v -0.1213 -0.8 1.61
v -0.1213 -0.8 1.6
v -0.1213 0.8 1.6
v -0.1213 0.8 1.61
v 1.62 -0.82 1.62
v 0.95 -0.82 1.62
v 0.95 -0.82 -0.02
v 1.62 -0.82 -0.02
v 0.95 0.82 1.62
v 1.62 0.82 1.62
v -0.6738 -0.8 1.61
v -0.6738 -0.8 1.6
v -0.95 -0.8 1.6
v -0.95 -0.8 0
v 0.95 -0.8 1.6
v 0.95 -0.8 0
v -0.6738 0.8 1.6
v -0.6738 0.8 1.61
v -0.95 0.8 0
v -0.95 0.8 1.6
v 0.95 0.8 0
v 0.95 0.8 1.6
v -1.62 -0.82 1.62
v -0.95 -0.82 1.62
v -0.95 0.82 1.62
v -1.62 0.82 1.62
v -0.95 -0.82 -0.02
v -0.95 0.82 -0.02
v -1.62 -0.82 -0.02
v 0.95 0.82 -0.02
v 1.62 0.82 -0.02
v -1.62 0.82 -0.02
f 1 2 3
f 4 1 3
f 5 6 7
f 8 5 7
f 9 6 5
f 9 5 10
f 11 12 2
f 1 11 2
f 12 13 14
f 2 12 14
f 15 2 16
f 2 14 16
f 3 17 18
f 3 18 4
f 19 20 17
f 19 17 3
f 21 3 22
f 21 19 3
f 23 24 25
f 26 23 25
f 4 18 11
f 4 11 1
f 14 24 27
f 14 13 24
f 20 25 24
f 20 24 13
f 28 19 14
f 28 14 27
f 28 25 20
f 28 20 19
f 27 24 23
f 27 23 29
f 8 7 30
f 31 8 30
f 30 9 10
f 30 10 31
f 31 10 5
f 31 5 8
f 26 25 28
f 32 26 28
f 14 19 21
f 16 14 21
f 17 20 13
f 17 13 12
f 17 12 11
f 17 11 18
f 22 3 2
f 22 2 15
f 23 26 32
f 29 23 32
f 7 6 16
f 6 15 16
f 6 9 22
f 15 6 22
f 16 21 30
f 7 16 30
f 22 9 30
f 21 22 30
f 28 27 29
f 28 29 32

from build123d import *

# Parameters (mm, degrees)
SKETCH1_W           = 3.2
SKETCH1_H           = 1.6
BOSS_EXTRUDE1_DEPTH = 1.6
BOSS_EXTRUDE2_START = -0.65
SKETCH2_W           = 1.64
SKETCH2_H           = 1.64
BOSS_EXTRUDE2_DEPTH = 0.67
SKETCH3_W           = 0.5525
SKETCH3_H           = 1.6
BOSS_EXTRUDE3_DEPTH = 0.01


with BuildPart() as part:
    # Sketch1 → Boss-Extrude1 (new body)
    with BuildSketch(Plane.XY):
        Rectangle(SKETCH1_W, SKETCH1_H)
    extrude(amount=BOSS_EXTRUDE1_DEPTH)

    # Sketch2 → Boss-Extrude2 (add)
    with BuildSketch(Plane(origin=(1.6, 0, 0), x_dir=(0, 0, -1), z_dir=(1, 0, 0)).offset(BOSS_EXTRUDE2_START)):
        with Locations((-0.8, 0)):
            Rectangle(SKETCH2_W, SKETCH2_H)
    boss_extrude2 = extrude(amount=BOSS_EXTRUDE2_DEPTH)

    # Mirror1: Boss-Extrude2 across plane
    add(boss_extrude2.mirror(Plane(origin=(0, 0, 0), x_dir=(0, 0, 1), z_dir=(1, 0, 0))))

    # Sketch3 → Boss-Extrude3 (add)
    with BuildSketch(Plane.XY.offset(1.6)):
        with Locations((-0.3975, 0)):
            Rectangle(SKETCH3_W, SKETCH3_H)
    extrude(amount=BOSS_EXTRUDE3_DEPTH)


solid = part.part
